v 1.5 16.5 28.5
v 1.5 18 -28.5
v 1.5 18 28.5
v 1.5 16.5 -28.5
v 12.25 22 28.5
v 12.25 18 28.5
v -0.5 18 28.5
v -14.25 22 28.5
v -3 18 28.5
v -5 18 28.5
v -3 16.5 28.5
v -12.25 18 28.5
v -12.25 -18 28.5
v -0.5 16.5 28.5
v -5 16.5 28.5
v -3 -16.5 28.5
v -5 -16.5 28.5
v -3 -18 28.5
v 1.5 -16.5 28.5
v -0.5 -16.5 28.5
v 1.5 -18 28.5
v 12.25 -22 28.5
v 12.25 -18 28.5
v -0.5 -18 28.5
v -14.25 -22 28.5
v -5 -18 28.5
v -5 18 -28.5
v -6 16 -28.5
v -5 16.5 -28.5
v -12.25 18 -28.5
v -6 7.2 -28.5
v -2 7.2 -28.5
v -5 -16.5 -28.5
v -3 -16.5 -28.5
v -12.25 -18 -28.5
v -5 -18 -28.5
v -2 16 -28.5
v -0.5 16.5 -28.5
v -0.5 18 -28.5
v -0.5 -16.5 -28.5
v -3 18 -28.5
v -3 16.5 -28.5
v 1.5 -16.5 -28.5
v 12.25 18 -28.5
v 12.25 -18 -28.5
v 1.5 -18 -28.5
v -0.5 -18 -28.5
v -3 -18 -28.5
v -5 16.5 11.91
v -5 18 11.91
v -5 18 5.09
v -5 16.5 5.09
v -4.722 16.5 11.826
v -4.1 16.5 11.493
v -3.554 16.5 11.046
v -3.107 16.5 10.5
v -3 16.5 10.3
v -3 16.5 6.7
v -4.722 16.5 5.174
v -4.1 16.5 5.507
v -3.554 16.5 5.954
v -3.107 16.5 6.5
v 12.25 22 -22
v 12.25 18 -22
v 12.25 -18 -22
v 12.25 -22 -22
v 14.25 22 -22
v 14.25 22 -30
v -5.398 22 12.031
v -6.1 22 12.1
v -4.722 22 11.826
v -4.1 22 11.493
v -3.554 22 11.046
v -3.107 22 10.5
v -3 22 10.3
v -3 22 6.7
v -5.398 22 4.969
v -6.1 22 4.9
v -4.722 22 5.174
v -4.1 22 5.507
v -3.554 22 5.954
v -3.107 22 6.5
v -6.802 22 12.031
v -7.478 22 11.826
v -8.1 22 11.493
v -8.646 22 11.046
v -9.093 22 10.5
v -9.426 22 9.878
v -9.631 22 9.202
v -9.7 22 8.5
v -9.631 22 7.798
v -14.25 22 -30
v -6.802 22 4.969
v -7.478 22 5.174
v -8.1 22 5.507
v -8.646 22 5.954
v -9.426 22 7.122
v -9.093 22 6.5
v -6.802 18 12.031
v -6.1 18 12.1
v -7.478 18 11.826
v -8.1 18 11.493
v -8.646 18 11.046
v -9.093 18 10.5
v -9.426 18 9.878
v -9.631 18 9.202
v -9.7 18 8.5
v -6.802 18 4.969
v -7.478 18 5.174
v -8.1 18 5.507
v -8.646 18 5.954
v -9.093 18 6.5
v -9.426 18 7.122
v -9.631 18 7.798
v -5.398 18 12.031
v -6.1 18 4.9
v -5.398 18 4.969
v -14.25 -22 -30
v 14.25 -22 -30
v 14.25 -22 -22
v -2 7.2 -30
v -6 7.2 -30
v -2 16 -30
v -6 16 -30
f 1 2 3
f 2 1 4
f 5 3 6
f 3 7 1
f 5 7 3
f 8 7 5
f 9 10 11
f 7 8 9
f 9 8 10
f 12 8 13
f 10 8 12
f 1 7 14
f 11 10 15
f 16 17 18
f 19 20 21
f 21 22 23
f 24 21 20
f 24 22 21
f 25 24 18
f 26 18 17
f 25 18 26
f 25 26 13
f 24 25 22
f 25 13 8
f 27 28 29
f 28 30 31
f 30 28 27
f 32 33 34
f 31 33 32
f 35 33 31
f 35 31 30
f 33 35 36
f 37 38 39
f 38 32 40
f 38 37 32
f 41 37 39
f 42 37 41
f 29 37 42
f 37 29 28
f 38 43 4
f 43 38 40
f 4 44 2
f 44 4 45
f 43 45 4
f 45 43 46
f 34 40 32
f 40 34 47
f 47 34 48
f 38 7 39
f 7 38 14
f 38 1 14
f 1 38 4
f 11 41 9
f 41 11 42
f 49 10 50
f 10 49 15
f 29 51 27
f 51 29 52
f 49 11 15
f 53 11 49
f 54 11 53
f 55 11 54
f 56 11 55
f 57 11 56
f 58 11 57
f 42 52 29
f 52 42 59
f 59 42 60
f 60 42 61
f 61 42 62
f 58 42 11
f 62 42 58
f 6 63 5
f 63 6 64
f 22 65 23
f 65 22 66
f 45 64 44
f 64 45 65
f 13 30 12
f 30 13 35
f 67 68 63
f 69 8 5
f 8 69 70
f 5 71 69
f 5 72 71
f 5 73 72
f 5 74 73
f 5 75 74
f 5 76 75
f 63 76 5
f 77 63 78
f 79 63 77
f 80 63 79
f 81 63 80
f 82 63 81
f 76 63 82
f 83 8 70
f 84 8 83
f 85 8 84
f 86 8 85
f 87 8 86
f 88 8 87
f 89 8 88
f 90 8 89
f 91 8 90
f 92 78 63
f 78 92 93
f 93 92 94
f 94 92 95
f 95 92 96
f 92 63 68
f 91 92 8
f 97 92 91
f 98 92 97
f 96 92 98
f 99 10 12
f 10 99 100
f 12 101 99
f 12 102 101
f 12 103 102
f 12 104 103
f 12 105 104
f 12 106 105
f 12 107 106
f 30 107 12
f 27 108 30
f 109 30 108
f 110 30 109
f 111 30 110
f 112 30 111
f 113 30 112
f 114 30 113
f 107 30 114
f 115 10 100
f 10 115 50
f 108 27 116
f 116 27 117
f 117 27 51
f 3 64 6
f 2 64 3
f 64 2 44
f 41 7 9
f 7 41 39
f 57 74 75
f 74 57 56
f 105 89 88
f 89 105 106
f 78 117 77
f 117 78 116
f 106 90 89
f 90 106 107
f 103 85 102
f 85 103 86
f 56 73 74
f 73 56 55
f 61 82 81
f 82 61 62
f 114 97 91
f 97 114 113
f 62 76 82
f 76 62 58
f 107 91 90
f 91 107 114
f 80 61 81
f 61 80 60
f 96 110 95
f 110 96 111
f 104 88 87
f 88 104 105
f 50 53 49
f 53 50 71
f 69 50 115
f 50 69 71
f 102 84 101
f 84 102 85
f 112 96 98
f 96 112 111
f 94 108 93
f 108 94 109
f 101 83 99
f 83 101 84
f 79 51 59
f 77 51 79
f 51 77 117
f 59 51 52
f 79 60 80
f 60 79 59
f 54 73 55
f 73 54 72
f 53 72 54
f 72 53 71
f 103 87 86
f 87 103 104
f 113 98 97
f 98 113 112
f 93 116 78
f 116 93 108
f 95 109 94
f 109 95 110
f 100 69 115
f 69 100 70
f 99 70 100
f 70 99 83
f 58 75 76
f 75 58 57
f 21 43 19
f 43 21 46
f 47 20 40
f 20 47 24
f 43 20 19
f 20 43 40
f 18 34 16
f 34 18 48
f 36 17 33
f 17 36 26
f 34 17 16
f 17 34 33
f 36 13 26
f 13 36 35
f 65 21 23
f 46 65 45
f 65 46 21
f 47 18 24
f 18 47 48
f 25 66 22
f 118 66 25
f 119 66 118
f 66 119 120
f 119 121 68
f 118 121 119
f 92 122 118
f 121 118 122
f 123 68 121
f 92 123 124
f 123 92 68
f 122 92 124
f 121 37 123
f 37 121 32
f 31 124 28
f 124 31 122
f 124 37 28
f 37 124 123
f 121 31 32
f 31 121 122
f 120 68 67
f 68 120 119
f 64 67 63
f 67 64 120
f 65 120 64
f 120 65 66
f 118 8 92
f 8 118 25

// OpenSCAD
length = 57;
width = 36;
wall_thickness = 4;
base_wall_thickness = 1.5;
board_overlap = 2;
height_above = 12+wall_thickness/2;
height_below = 7+wall_thickness/2;
board_thickness = 1.5;
micro_usb_offset = 2;
micro_usb_width = 7.8 + 1;
micro_usb_height = 3 + 1;
sma_length_offset = 37;
sma_diameter = 6.2 + 1;
sma_flat_diameter = 5.7;
sma_flat_offset = 5.7+0.5-6.2/2;
sma_height_offset = sma_diameter / 2;
depth = height_above + height_below + board_thickness;

union(){
	translate([depth/2+wall_thickness/4,0,-length/2+(wall_thickness-base_wall_thickness)])
		cube([wall_thickness/2,width+wall_thickness*2,wall_thickness*2], center=true);
	translate([-depth/2-wall_thickness/4,0,-base_wall_thickness/2])
		cube([wall_thickness/2,width+wall_thickness*2,length+base_wall_thickness], center=true);
	translate([0,width/2+wall_thickness/2,0])
		difference(){
			union(){
				cube([depth, wall_thickness, length], center=true);
				translate([
					depth/2 - height_above - board_overlap/2,
					-board_overlap*1.25,
				0])
					union(){
						translate([board_overlap + board_thickness/2 + 0.5,0,0])
							cube([board_overlap, board_overlap, length],
								center=true);
						translate([ - board_thickness/2 - 0.5,0,0])
							cube([board_overlap, board_overlap, length],
								center=true);
					}
			}
			rotate([90,00,0])
				translate([depth/2 - height_above - board_thickness/2-sma_height_offset,-length/2+sma_length_offset,0])
					difference(){
						cylinder(h=wall_thickness*3,r=sma_diameter/2,$fn=32,center=true);
						translate([sma_flat_offset+sma_flat_diameter/2,0,0])
							cube([sma_flat_diameter,sma_flat_diameter,sma_flat_diameter*2], center=true);
					}
		}
	translate([0,-width/2-wall_thickness/2,0])
		union(){
			cube([depth, wall_thickness, length], center=true);
			translate([
				depth/2 - height_above - board_overlap/2,
				board_overlap*1.25,
			0])
				union(){
					translate([board_overlap + board_thickness/2 + 0.5,0,0])
						cube([board_overlap, board_overlap, length],
							center=true);
					translate([ - board_thickness/2 - 0.5,0,0])
						cube([board_overlap, board_overlap, length],
							center=true);
				}
		}
	translate([0,0,-length/2 - base_wall_thickness/2])
		difference(){
			cube([depth, width + wall_thickness*2, base_wall_thickness], center=true);
			translate([
				depth/2 - height_above - board_thickness/2 - micro_usb_height/2 + 0.5,
				width/2 - micro_usb_offset - micro_usb_width /2,
				0]
			)
				cube([micro_usb_height, micro_usb_width, wall_thickness * 2], center=true);
		}
}
